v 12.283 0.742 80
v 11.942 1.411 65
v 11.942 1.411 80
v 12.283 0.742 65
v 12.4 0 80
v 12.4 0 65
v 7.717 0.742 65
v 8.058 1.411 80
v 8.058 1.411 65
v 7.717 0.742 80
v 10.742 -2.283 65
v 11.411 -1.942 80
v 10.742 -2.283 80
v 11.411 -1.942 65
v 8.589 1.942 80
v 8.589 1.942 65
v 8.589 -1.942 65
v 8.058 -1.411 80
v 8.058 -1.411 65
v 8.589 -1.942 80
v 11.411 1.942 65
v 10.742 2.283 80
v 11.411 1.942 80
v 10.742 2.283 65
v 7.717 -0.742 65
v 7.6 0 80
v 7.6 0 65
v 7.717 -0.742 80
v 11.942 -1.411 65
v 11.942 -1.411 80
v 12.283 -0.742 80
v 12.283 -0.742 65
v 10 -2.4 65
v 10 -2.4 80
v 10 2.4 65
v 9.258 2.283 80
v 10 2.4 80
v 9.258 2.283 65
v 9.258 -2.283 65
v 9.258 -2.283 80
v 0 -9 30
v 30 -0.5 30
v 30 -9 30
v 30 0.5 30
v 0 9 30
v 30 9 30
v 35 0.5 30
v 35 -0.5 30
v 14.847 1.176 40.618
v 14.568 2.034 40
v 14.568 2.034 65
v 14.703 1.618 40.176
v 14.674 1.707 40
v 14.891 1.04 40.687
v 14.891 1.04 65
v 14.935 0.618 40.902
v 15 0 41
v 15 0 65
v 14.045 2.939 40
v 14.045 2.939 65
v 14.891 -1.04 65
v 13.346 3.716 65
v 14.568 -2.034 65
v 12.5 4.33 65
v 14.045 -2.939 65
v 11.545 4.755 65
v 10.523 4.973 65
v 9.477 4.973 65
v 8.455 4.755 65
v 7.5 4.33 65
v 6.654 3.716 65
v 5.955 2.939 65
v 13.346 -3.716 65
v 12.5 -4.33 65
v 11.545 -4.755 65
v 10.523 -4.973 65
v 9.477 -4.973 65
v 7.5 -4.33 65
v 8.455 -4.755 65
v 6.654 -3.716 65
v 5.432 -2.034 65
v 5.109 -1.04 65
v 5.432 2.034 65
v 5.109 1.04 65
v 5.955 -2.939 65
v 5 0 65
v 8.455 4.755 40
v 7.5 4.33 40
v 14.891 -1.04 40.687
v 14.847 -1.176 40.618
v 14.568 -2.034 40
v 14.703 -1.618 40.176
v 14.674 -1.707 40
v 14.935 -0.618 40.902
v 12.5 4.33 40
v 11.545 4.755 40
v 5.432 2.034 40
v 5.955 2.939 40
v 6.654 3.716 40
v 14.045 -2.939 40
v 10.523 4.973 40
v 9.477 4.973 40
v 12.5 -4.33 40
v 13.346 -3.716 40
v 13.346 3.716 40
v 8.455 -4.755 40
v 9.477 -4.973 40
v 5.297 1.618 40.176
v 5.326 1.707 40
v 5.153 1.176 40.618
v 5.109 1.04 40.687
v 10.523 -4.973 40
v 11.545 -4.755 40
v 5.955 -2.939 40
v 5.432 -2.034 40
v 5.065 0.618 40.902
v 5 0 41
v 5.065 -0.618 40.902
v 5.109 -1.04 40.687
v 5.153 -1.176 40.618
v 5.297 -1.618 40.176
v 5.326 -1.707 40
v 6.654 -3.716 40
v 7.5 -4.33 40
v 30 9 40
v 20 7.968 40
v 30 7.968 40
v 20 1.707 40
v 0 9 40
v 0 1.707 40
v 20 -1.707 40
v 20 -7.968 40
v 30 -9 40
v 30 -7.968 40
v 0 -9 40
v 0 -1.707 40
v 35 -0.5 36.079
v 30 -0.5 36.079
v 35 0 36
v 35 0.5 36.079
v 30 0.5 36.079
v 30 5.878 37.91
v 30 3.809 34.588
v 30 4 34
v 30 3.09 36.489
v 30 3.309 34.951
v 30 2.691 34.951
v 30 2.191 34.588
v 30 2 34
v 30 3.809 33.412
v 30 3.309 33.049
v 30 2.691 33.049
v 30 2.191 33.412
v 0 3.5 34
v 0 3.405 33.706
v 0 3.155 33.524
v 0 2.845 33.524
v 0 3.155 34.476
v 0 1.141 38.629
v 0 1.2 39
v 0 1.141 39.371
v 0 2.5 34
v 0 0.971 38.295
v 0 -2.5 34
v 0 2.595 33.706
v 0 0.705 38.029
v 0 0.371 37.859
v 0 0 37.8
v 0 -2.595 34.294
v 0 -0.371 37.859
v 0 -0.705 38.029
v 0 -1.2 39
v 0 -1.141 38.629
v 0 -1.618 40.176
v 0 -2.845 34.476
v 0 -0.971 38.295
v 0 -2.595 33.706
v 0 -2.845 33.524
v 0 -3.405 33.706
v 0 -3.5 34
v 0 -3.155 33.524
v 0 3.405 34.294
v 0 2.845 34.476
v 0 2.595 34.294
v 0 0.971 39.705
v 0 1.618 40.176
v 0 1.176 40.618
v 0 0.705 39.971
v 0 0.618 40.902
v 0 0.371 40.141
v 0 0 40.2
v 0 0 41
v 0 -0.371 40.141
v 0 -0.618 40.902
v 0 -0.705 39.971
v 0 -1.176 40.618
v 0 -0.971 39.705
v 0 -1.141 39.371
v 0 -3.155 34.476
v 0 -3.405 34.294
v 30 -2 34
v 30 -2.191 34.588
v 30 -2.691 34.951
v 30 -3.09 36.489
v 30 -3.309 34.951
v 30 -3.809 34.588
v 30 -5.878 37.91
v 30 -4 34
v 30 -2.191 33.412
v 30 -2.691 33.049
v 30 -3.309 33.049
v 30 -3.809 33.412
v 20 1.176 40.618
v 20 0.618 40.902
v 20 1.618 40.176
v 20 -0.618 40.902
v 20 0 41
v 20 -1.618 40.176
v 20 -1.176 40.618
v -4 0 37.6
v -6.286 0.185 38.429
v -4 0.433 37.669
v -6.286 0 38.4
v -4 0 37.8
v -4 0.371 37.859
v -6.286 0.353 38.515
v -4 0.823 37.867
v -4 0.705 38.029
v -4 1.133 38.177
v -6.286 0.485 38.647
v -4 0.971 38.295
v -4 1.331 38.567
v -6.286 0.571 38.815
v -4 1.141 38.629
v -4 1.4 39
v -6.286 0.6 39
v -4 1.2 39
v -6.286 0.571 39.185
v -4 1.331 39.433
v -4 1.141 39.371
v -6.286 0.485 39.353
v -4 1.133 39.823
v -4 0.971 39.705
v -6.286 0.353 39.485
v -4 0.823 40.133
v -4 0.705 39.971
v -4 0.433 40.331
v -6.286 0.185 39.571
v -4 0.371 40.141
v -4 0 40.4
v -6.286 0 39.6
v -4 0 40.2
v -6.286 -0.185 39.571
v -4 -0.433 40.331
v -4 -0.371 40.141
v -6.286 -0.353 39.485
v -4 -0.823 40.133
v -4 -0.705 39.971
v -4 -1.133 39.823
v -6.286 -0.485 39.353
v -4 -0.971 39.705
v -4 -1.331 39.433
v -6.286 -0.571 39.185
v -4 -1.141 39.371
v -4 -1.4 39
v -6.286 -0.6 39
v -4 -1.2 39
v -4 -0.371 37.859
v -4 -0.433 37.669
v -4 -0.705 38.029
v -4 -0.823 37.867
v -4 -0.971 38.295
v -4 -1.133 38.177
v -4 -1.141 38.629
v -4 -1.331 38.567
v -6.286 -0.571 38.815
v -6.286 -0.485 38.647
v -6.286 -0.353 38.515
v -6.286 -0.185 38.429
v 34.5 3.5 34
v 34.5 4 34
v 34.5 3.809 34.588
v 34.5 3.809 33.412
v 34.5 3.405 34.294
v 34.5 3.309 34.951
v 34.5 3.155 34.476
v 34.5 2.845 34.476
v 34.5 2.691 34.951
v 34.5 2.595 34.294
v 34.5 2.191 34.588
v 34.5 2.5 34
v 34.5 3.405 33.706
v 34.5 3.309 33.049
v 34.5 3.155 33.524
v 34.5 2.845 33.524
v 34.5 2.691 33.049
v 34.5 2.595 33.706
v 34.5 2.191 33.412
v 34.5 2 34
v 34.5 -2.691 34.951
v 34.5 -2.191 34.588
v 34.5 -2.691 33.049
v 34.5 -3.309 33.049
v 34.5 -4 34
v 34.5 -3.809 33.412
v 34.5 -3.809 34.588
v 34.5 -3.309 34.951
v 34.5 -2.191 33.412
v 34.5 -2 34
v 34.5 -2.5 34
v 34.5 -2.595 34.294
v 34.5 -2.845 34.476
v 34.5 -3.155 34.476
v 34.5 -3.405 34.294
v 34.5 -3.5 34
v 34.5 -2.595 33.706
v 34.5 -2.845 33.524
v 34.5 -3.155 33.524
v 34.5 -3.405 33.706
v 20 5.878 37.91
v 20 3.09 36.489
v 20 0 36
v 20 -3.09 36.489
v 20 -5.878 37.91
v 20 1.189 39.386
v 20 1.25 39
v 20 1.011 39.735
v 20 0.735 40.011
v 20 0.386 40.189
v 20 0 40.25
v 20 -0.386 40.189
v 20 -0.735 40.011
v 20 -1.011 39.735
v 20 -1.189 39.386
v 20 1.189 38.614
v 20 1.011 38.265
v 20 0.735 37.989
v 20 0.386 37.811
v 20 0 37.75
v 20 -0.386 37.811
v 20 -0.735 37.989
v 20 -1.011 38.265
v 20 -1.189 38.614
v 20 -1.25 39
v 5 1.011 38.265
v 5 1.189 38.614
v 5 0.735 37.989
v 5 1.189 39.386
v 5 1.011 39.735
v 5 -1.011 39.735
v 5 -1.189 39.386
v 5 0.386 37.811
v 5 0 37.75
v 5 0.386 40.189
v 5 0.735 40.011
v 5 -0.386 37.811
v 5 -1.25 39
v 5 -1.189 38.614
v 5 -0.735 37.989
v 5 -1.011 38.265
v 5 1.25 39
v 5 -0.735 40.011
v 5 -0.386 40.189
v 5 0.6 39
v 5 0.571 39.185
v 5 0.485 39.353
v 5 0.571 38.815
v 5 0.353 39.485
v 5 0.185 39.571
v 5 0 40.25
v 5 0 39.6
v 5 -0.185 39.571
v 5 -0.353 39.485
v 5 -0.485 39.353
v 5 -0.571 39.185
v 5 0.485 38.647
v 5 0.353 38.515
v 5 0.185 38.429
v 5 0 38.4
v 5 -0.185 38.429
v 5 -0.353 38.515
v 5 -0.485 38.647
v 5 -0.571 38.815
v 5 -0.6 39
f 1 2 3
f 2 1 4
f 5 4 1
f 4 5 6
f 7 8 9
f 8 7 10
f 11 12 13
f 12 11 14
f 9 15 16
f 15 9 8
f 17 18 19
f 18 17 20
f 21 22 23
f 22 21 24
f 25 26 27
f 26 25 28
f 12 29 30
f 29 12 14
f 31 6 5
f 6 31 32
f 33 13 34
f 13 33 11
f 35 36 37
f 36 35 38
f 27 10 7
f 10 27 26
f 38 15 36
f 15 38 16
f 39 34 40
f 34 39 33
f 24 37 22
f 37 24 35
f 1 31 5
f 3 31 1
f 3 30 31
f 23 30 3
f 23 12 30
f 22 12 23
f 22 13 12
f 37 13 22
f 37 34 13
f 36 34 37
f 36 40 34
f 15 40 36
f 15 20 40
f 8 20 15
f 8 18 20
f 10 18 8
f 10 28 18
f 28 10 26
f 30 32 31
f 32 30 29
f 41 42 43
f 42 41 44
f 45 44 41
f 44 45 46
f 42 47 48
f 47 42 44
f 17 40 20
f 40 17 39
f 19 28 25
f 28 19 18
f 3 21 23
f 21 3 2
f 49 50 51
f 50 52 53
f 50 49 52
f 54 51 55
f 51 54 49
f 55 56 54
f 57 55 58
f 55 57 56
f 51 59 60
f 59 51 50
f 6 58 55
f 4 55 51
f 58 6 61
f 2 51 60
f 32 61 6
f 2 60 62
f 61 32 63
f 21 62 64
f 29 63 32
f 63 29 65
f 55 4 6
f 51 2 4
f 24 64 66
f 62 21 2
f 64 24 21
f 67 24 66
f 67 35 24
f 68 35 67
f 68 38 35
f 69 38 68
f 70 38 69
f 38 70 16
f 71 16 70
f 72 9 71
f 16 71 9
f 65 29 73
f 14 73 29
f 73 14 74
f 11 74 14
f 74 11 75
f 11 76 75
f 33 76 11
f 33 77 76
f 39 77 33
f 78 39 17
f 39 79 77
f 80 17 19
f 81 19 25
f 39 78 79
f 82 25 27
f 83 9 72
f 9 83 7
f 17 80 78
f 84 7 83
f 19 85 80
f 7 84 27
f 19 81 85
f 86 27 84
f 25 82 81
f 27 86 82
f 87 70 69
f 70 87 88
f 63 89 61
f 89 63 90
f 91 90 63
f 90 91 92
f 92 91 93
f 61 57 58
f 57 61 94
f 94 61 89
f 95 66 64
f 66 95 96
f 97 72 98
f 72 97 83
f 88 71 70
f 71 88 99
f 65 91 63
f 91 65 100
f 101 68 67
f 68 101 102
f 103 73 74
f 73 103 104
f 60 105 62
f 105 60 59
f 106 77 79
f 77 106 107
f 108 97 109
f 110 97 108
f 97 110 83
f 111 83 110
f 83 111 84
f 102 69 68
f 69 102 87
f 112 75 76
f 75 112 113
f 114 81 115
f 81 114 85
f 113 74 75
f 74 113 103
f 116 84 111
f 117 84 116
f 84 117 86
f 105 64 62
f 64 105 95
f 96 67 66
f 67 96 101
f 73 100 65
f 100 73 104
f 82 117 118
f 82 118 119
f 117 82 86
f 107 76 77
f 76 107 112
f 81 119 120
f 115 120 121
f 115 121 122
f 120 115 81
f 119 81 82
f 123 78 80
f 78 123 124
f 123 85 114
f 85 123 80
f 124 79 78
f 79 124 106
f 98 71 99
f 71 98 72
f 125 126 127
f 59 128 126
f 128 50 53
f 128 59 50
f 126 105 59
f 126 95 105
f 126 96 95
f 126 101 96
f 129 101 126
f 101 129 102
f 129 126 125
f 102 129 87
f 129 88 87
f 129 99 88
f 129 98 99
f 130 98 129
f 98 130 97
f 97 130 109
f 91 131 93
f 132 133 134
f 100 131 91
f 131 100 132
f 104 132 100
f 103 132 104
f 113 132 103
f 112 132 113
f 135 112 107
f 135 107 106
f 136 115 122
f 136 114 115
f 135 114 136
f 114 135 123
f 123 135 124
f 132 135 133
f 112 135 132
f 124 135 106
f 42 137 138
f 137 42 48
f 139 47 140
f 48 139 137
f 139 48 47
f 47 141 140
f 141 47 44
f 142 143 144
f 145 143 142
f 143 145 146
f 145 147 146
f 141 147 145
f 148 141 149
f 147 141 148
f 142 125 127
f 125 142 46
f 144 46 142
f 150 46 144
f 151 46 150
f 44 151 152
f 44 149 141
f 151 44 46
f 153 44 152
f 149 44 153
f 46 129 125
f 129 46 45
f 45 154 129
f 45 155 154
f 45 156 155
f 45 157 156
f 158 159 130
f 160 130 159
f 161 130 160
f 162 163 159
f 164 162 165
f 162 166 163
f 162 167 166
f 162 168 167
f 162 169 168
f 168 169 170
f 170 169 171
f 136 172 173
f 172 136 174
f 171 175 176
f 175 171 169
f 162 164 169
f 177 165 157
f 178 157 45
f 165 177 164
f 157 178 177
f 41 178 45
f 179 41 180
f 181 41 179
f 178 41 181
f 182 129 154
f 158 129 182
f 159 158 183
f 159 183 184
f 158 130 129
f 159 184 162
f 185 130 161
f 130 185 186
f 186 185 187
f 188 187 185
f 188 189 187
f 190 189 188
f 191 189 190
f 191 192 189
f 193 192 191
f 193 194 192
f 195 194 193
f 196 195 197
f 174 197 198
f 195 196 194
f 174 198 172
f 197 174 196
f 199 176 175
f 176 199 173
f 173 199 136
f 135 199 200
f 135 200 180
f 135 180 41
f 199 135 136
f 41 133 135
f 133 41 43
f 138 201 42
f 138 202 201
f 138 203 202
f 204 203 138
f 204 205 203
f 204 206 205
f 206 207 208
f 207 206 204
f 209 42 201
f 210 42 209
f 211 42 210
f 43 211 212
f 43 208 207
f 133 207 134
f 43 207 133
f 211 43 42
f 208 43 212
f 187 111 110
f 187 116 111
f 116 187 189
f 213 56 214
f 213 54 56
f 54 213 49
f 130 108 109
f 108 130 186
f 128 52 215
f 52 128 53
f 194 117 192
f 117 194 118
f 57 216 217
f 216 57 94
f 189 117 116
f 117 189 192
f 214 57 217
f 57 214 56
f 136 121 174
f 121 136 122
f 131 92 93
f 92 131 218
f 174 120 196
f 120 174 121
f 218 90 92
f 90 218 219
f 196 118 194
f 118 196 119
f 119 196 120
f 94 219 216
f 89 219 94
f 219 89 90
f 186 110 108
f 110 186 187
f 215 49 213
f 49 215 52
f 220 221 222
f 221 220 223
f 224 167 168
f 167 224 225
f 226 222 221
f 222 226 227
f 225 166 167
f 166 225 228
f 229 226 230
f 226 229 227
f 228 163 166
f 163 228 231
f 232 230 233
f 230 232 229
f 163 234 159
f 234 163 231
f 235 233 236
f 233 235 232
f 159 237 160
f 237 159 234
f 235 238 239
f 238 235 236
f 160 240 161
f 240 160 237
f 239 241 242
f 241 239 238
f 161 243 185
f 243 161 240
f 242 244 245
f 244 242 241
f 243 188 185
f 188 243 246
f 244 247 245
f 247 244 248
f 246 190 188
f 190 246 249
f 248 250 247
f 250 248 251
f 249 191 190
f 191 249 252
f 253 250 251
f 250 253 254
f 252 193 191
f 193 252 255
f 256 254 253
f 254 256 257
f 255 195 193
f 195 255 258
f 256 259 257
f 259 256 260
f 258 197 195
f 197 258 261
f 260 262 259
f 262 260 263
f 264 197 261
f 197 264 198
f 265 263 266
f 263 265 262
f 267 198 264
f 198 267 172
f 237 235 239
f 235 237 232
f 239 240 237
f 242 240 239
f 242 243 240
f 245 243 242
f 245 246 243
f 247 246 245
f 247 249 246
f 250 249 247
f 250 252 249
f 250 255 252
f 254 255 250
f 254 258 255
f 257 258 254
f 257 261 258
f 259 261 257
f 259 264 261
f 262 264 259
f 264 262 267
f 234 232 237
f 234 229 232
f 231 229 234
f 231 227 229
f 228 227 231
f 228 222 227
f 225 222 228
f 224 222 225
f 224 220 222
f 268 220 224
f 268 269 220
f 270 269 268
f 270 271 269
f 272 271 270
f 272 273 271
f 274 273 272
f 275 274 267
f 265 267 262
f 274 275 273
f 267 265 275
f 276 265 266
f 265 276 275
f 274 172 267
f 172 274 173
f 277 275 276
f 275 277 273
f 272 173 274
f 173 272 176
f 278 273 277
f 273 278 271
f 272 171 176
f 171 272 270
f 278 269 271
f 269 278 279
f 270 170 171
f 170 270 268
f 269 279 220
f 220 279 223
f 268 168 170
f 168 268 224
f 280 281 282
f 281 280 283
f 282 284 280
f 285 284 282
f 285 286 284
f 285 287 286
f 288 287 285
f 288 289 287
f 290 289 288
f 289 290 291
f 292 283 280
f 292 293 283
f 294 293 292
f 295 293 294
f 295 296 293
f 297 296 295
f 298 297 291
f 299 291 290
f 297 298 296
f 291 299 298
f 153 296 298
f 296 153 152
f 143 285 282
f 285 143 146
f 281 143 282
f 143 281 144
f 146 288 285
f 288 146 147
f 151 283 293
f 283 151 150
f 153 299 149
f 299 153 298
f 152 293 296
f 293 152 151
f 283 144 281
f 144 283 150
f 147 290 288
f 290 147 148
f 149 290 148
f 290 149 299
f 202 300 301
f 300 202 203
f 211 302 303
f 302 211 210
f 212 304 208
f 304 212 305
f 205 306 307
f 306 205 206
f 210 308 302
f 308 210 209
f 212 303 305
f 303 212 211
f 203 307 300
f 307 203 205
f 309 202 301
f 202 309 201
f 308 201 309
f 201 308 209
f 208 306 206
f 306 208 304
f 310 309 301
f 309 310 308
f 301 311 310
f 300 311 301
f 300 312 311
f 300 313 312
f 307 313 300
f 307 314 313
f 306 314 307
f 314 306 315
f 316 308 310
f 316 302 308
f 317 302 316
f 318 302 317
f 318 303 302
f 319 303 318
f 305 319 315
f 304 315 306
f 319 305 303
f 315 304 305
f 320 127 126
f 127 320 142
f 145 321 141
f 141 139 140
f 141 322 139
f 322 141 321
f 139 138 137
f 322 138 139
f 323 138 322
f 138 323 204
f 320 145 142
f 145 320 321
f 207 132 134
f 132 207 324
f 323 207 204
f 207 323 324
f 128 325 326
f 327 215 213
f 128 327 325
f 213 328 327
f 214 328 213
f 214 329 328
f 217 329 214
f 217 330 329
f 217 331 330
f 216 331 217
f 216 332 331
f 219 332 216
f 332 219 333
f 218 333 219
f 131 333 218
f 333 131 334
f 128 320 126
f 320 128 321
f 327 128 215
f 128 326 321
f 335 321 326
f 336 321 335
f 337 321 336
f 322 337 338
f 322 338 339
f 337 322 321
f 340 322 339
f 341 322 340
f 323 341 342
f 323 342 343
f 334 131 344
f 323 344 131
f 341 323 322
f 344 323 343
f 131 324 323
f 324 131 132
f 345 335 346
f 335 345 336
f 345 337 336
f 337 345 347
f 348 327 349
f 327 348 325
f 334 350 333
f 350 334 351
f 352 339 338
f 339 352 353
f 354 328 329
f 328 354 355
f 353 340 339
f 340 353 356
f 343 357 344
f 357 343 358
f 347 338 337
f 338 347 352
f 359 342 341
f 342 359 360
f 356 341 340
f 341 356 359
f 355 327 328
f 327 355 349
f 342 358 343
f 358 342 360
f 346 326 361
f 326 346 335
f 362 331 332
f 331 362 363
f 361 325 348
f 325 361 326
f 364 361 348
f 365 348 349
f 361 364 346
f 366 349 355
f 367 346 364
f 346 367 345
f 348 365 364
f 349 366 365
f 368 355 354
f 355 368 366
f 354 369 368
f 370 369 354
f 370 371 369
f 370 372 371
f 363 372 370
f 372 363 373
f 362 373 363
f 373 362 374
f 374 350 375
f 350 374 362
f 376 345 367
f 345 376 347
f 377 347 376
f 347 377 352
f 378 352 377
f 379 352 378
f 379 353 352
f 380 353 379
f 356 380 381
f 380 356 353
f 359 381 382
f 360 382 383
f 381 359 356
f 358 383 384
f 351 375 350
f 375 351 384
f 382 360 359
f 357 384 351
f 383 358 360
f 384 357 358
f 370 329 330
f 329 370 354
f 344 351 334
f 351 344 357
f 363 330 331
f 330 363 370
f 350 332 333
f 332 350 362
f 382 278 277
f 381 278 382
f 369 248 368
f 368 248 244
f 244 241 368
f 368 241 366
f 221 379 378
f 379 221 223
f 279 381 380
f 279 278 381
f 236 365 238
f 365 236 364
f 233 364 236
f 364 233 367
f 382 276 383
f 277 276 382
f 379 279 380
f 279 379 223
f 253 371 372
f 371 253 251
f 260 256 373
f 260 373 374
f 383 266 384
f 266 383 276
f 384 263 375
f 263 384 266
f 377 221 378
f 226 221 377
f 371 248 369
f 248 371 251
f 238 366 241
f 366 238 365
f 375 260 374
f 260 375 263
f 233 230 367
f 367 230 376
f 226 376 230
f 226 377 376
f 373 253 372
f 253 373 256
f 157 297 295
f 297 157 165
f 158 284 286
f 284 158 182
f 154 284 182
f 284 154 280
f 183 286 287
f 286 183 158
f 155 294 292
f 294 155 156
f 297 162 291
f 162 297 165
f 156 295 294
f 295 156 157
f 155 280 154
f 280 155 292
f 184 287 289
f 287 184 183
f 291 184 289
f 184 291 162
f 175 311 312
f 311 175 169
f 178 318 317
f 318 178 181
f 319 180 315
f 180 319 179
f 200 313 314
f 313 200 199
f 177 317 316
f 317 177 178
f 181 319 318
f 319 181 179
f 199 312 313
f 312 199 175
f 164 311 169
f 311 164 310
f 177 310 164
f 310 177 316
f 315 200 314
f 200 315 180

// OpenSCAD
module slidingSlot(){
	difference(){
		rotate_extrude(){
			translate([40,0,0])
			polygon(points=[[0,0],[16,0],[16,10],[9,10],[9,7],[13,4],[13,3],[3,3],[3,4],[5,7],[5,10],[0,10]]);
		}
		translate([0,0,-5])
		linear_extrude(height=20)
		polygon(points=[[60,60],[-60,60],[0,0],[-60,-60],[60,-60]]);
	}
}

module waterNeedleHolder(xx,yy,zz){
	difference(){
		union(){
			// translate([5,0,zz+8])
			// rotate([90,0,90])
			// linear_extrude(height=15)
			// polygon(points=[[1,0],[1,5],[2,5],[0,12],[-2,5],[-1,5],[-1,0]]);
			
			//Top Scaffold Adaptor
			translate([10,0,zz]){
				cylinder(d=4.8,h=50,$fn=20);
				cylinder(d=10,h=35,$fn=30);
			}
		
			//Base
			translate([xx,yy,zz])
			linear_extrude(height=10)
			polygon(points=[[30,9],[30,0.5],[35,0.5],[35,-0.5],[30,-0.5],[30,-9],[0,-9],[0,9]]);

			//Odor Tube
			translate([xx,yy,zz+9])
			rotate([0,90,0])	
			cylinder(h=35,d=4,$fn=20);
			
			//Back Odor Tube Adaptor
			translate([xx,yy,zz+9])
			rotate([0,-90,0])
			rotate_extrude($fn=20)
			polygon(points=[[0,0],[1.2,0],[1.2,4],[1.4,4],[0,8]]);
		
			//Left Water Port
			translate([xx,yy+3,zz+4])
			rotate([90,0,90]){
				cylinder(d=2,h=34.5,$fn=10);
			}
			
			//Right Water Port
			translate([xx,yy-3,zz+4])
			rotate([-90,0,-90]){
				cylinder(d=2,h=34.5,$fn=10);
			}
		}
		
		// //Bottom Groove
		// translate([xx-15,yy,zz-6])
		// linear_extrude(height=10)
		// polygon(points=[[30,4],[30,-4],[0,-24],[0,24]]);

		//Nose Groove
		translate([xx+20,yy,zz+16])
		rotate([0,90,0])
		cylinder(h=25,d=20,$fn=20);
		
		//Odor Tube
		translate([xx+5,yy,zz+9])
		rotate([0,90,0])
		cylinder(h=32,d=2.5,$fn=20);
		
		//Odor Tube
		translate([xx-15,yy,zz+9])
		rotate([0,90,0])
		cylinder(h=60,d=1.2,$fn=20);
		
		// //Left Needle Slot
		// translate([xx-14,yy+30,zz+5])
		// rotate([90,0,60]){
			// cylinder(d=1.2,h=55,$fn=10);
			// translate([-0.4,0,0])
			// cube([0.8,10,55]);
		// }
		
		// //Right Needle Slot
		// translate([xx-14,yy-30,zz+5])
		// rotate([-90,0,-60]){
			// cylinder(d=1.2,h=55,$fn=10);
			// translate([-0.4,-10,0])
			// cube([0.8,10,55]);
		// }
		
		//Left Water Tube
		translate([xx-10,yy+3,zz+4])
		rotate([90,0,90]){
			cylinder(d=1,h=50,$fn=10);
		}
		
		//Right Water Tube
		translate([xx-10,yy-3,zz+4])
		rotate([-90,0,-90]){
			cylinder(d=1,h=50,$fn=10);
		}
		
	}
}

module functionColumn(){
	
}

module mousePlatform(){
	translate([0,-100,0])
	color("grey",1.0){
		cube([200,200,10]);
		translate([60,50,0])
		cube([20,100,20]);
	}
	translate([50,0,37.5])
	rotate([0,90,0])
	{
		difference(){	
			difference(){
				color("white",0.7){
					cylinder(d=45,h=150);
				}
				translate([0,0,-10])
				cylinder(d=35,h=170);
			}
			translate([-30,-50,-10])
			cube([20,100,170]);
		}
	}
}


// mousePlatform();
// translate([70,0,20])
// slidingSlot();

waterNeedleHolder(0,0,30);
